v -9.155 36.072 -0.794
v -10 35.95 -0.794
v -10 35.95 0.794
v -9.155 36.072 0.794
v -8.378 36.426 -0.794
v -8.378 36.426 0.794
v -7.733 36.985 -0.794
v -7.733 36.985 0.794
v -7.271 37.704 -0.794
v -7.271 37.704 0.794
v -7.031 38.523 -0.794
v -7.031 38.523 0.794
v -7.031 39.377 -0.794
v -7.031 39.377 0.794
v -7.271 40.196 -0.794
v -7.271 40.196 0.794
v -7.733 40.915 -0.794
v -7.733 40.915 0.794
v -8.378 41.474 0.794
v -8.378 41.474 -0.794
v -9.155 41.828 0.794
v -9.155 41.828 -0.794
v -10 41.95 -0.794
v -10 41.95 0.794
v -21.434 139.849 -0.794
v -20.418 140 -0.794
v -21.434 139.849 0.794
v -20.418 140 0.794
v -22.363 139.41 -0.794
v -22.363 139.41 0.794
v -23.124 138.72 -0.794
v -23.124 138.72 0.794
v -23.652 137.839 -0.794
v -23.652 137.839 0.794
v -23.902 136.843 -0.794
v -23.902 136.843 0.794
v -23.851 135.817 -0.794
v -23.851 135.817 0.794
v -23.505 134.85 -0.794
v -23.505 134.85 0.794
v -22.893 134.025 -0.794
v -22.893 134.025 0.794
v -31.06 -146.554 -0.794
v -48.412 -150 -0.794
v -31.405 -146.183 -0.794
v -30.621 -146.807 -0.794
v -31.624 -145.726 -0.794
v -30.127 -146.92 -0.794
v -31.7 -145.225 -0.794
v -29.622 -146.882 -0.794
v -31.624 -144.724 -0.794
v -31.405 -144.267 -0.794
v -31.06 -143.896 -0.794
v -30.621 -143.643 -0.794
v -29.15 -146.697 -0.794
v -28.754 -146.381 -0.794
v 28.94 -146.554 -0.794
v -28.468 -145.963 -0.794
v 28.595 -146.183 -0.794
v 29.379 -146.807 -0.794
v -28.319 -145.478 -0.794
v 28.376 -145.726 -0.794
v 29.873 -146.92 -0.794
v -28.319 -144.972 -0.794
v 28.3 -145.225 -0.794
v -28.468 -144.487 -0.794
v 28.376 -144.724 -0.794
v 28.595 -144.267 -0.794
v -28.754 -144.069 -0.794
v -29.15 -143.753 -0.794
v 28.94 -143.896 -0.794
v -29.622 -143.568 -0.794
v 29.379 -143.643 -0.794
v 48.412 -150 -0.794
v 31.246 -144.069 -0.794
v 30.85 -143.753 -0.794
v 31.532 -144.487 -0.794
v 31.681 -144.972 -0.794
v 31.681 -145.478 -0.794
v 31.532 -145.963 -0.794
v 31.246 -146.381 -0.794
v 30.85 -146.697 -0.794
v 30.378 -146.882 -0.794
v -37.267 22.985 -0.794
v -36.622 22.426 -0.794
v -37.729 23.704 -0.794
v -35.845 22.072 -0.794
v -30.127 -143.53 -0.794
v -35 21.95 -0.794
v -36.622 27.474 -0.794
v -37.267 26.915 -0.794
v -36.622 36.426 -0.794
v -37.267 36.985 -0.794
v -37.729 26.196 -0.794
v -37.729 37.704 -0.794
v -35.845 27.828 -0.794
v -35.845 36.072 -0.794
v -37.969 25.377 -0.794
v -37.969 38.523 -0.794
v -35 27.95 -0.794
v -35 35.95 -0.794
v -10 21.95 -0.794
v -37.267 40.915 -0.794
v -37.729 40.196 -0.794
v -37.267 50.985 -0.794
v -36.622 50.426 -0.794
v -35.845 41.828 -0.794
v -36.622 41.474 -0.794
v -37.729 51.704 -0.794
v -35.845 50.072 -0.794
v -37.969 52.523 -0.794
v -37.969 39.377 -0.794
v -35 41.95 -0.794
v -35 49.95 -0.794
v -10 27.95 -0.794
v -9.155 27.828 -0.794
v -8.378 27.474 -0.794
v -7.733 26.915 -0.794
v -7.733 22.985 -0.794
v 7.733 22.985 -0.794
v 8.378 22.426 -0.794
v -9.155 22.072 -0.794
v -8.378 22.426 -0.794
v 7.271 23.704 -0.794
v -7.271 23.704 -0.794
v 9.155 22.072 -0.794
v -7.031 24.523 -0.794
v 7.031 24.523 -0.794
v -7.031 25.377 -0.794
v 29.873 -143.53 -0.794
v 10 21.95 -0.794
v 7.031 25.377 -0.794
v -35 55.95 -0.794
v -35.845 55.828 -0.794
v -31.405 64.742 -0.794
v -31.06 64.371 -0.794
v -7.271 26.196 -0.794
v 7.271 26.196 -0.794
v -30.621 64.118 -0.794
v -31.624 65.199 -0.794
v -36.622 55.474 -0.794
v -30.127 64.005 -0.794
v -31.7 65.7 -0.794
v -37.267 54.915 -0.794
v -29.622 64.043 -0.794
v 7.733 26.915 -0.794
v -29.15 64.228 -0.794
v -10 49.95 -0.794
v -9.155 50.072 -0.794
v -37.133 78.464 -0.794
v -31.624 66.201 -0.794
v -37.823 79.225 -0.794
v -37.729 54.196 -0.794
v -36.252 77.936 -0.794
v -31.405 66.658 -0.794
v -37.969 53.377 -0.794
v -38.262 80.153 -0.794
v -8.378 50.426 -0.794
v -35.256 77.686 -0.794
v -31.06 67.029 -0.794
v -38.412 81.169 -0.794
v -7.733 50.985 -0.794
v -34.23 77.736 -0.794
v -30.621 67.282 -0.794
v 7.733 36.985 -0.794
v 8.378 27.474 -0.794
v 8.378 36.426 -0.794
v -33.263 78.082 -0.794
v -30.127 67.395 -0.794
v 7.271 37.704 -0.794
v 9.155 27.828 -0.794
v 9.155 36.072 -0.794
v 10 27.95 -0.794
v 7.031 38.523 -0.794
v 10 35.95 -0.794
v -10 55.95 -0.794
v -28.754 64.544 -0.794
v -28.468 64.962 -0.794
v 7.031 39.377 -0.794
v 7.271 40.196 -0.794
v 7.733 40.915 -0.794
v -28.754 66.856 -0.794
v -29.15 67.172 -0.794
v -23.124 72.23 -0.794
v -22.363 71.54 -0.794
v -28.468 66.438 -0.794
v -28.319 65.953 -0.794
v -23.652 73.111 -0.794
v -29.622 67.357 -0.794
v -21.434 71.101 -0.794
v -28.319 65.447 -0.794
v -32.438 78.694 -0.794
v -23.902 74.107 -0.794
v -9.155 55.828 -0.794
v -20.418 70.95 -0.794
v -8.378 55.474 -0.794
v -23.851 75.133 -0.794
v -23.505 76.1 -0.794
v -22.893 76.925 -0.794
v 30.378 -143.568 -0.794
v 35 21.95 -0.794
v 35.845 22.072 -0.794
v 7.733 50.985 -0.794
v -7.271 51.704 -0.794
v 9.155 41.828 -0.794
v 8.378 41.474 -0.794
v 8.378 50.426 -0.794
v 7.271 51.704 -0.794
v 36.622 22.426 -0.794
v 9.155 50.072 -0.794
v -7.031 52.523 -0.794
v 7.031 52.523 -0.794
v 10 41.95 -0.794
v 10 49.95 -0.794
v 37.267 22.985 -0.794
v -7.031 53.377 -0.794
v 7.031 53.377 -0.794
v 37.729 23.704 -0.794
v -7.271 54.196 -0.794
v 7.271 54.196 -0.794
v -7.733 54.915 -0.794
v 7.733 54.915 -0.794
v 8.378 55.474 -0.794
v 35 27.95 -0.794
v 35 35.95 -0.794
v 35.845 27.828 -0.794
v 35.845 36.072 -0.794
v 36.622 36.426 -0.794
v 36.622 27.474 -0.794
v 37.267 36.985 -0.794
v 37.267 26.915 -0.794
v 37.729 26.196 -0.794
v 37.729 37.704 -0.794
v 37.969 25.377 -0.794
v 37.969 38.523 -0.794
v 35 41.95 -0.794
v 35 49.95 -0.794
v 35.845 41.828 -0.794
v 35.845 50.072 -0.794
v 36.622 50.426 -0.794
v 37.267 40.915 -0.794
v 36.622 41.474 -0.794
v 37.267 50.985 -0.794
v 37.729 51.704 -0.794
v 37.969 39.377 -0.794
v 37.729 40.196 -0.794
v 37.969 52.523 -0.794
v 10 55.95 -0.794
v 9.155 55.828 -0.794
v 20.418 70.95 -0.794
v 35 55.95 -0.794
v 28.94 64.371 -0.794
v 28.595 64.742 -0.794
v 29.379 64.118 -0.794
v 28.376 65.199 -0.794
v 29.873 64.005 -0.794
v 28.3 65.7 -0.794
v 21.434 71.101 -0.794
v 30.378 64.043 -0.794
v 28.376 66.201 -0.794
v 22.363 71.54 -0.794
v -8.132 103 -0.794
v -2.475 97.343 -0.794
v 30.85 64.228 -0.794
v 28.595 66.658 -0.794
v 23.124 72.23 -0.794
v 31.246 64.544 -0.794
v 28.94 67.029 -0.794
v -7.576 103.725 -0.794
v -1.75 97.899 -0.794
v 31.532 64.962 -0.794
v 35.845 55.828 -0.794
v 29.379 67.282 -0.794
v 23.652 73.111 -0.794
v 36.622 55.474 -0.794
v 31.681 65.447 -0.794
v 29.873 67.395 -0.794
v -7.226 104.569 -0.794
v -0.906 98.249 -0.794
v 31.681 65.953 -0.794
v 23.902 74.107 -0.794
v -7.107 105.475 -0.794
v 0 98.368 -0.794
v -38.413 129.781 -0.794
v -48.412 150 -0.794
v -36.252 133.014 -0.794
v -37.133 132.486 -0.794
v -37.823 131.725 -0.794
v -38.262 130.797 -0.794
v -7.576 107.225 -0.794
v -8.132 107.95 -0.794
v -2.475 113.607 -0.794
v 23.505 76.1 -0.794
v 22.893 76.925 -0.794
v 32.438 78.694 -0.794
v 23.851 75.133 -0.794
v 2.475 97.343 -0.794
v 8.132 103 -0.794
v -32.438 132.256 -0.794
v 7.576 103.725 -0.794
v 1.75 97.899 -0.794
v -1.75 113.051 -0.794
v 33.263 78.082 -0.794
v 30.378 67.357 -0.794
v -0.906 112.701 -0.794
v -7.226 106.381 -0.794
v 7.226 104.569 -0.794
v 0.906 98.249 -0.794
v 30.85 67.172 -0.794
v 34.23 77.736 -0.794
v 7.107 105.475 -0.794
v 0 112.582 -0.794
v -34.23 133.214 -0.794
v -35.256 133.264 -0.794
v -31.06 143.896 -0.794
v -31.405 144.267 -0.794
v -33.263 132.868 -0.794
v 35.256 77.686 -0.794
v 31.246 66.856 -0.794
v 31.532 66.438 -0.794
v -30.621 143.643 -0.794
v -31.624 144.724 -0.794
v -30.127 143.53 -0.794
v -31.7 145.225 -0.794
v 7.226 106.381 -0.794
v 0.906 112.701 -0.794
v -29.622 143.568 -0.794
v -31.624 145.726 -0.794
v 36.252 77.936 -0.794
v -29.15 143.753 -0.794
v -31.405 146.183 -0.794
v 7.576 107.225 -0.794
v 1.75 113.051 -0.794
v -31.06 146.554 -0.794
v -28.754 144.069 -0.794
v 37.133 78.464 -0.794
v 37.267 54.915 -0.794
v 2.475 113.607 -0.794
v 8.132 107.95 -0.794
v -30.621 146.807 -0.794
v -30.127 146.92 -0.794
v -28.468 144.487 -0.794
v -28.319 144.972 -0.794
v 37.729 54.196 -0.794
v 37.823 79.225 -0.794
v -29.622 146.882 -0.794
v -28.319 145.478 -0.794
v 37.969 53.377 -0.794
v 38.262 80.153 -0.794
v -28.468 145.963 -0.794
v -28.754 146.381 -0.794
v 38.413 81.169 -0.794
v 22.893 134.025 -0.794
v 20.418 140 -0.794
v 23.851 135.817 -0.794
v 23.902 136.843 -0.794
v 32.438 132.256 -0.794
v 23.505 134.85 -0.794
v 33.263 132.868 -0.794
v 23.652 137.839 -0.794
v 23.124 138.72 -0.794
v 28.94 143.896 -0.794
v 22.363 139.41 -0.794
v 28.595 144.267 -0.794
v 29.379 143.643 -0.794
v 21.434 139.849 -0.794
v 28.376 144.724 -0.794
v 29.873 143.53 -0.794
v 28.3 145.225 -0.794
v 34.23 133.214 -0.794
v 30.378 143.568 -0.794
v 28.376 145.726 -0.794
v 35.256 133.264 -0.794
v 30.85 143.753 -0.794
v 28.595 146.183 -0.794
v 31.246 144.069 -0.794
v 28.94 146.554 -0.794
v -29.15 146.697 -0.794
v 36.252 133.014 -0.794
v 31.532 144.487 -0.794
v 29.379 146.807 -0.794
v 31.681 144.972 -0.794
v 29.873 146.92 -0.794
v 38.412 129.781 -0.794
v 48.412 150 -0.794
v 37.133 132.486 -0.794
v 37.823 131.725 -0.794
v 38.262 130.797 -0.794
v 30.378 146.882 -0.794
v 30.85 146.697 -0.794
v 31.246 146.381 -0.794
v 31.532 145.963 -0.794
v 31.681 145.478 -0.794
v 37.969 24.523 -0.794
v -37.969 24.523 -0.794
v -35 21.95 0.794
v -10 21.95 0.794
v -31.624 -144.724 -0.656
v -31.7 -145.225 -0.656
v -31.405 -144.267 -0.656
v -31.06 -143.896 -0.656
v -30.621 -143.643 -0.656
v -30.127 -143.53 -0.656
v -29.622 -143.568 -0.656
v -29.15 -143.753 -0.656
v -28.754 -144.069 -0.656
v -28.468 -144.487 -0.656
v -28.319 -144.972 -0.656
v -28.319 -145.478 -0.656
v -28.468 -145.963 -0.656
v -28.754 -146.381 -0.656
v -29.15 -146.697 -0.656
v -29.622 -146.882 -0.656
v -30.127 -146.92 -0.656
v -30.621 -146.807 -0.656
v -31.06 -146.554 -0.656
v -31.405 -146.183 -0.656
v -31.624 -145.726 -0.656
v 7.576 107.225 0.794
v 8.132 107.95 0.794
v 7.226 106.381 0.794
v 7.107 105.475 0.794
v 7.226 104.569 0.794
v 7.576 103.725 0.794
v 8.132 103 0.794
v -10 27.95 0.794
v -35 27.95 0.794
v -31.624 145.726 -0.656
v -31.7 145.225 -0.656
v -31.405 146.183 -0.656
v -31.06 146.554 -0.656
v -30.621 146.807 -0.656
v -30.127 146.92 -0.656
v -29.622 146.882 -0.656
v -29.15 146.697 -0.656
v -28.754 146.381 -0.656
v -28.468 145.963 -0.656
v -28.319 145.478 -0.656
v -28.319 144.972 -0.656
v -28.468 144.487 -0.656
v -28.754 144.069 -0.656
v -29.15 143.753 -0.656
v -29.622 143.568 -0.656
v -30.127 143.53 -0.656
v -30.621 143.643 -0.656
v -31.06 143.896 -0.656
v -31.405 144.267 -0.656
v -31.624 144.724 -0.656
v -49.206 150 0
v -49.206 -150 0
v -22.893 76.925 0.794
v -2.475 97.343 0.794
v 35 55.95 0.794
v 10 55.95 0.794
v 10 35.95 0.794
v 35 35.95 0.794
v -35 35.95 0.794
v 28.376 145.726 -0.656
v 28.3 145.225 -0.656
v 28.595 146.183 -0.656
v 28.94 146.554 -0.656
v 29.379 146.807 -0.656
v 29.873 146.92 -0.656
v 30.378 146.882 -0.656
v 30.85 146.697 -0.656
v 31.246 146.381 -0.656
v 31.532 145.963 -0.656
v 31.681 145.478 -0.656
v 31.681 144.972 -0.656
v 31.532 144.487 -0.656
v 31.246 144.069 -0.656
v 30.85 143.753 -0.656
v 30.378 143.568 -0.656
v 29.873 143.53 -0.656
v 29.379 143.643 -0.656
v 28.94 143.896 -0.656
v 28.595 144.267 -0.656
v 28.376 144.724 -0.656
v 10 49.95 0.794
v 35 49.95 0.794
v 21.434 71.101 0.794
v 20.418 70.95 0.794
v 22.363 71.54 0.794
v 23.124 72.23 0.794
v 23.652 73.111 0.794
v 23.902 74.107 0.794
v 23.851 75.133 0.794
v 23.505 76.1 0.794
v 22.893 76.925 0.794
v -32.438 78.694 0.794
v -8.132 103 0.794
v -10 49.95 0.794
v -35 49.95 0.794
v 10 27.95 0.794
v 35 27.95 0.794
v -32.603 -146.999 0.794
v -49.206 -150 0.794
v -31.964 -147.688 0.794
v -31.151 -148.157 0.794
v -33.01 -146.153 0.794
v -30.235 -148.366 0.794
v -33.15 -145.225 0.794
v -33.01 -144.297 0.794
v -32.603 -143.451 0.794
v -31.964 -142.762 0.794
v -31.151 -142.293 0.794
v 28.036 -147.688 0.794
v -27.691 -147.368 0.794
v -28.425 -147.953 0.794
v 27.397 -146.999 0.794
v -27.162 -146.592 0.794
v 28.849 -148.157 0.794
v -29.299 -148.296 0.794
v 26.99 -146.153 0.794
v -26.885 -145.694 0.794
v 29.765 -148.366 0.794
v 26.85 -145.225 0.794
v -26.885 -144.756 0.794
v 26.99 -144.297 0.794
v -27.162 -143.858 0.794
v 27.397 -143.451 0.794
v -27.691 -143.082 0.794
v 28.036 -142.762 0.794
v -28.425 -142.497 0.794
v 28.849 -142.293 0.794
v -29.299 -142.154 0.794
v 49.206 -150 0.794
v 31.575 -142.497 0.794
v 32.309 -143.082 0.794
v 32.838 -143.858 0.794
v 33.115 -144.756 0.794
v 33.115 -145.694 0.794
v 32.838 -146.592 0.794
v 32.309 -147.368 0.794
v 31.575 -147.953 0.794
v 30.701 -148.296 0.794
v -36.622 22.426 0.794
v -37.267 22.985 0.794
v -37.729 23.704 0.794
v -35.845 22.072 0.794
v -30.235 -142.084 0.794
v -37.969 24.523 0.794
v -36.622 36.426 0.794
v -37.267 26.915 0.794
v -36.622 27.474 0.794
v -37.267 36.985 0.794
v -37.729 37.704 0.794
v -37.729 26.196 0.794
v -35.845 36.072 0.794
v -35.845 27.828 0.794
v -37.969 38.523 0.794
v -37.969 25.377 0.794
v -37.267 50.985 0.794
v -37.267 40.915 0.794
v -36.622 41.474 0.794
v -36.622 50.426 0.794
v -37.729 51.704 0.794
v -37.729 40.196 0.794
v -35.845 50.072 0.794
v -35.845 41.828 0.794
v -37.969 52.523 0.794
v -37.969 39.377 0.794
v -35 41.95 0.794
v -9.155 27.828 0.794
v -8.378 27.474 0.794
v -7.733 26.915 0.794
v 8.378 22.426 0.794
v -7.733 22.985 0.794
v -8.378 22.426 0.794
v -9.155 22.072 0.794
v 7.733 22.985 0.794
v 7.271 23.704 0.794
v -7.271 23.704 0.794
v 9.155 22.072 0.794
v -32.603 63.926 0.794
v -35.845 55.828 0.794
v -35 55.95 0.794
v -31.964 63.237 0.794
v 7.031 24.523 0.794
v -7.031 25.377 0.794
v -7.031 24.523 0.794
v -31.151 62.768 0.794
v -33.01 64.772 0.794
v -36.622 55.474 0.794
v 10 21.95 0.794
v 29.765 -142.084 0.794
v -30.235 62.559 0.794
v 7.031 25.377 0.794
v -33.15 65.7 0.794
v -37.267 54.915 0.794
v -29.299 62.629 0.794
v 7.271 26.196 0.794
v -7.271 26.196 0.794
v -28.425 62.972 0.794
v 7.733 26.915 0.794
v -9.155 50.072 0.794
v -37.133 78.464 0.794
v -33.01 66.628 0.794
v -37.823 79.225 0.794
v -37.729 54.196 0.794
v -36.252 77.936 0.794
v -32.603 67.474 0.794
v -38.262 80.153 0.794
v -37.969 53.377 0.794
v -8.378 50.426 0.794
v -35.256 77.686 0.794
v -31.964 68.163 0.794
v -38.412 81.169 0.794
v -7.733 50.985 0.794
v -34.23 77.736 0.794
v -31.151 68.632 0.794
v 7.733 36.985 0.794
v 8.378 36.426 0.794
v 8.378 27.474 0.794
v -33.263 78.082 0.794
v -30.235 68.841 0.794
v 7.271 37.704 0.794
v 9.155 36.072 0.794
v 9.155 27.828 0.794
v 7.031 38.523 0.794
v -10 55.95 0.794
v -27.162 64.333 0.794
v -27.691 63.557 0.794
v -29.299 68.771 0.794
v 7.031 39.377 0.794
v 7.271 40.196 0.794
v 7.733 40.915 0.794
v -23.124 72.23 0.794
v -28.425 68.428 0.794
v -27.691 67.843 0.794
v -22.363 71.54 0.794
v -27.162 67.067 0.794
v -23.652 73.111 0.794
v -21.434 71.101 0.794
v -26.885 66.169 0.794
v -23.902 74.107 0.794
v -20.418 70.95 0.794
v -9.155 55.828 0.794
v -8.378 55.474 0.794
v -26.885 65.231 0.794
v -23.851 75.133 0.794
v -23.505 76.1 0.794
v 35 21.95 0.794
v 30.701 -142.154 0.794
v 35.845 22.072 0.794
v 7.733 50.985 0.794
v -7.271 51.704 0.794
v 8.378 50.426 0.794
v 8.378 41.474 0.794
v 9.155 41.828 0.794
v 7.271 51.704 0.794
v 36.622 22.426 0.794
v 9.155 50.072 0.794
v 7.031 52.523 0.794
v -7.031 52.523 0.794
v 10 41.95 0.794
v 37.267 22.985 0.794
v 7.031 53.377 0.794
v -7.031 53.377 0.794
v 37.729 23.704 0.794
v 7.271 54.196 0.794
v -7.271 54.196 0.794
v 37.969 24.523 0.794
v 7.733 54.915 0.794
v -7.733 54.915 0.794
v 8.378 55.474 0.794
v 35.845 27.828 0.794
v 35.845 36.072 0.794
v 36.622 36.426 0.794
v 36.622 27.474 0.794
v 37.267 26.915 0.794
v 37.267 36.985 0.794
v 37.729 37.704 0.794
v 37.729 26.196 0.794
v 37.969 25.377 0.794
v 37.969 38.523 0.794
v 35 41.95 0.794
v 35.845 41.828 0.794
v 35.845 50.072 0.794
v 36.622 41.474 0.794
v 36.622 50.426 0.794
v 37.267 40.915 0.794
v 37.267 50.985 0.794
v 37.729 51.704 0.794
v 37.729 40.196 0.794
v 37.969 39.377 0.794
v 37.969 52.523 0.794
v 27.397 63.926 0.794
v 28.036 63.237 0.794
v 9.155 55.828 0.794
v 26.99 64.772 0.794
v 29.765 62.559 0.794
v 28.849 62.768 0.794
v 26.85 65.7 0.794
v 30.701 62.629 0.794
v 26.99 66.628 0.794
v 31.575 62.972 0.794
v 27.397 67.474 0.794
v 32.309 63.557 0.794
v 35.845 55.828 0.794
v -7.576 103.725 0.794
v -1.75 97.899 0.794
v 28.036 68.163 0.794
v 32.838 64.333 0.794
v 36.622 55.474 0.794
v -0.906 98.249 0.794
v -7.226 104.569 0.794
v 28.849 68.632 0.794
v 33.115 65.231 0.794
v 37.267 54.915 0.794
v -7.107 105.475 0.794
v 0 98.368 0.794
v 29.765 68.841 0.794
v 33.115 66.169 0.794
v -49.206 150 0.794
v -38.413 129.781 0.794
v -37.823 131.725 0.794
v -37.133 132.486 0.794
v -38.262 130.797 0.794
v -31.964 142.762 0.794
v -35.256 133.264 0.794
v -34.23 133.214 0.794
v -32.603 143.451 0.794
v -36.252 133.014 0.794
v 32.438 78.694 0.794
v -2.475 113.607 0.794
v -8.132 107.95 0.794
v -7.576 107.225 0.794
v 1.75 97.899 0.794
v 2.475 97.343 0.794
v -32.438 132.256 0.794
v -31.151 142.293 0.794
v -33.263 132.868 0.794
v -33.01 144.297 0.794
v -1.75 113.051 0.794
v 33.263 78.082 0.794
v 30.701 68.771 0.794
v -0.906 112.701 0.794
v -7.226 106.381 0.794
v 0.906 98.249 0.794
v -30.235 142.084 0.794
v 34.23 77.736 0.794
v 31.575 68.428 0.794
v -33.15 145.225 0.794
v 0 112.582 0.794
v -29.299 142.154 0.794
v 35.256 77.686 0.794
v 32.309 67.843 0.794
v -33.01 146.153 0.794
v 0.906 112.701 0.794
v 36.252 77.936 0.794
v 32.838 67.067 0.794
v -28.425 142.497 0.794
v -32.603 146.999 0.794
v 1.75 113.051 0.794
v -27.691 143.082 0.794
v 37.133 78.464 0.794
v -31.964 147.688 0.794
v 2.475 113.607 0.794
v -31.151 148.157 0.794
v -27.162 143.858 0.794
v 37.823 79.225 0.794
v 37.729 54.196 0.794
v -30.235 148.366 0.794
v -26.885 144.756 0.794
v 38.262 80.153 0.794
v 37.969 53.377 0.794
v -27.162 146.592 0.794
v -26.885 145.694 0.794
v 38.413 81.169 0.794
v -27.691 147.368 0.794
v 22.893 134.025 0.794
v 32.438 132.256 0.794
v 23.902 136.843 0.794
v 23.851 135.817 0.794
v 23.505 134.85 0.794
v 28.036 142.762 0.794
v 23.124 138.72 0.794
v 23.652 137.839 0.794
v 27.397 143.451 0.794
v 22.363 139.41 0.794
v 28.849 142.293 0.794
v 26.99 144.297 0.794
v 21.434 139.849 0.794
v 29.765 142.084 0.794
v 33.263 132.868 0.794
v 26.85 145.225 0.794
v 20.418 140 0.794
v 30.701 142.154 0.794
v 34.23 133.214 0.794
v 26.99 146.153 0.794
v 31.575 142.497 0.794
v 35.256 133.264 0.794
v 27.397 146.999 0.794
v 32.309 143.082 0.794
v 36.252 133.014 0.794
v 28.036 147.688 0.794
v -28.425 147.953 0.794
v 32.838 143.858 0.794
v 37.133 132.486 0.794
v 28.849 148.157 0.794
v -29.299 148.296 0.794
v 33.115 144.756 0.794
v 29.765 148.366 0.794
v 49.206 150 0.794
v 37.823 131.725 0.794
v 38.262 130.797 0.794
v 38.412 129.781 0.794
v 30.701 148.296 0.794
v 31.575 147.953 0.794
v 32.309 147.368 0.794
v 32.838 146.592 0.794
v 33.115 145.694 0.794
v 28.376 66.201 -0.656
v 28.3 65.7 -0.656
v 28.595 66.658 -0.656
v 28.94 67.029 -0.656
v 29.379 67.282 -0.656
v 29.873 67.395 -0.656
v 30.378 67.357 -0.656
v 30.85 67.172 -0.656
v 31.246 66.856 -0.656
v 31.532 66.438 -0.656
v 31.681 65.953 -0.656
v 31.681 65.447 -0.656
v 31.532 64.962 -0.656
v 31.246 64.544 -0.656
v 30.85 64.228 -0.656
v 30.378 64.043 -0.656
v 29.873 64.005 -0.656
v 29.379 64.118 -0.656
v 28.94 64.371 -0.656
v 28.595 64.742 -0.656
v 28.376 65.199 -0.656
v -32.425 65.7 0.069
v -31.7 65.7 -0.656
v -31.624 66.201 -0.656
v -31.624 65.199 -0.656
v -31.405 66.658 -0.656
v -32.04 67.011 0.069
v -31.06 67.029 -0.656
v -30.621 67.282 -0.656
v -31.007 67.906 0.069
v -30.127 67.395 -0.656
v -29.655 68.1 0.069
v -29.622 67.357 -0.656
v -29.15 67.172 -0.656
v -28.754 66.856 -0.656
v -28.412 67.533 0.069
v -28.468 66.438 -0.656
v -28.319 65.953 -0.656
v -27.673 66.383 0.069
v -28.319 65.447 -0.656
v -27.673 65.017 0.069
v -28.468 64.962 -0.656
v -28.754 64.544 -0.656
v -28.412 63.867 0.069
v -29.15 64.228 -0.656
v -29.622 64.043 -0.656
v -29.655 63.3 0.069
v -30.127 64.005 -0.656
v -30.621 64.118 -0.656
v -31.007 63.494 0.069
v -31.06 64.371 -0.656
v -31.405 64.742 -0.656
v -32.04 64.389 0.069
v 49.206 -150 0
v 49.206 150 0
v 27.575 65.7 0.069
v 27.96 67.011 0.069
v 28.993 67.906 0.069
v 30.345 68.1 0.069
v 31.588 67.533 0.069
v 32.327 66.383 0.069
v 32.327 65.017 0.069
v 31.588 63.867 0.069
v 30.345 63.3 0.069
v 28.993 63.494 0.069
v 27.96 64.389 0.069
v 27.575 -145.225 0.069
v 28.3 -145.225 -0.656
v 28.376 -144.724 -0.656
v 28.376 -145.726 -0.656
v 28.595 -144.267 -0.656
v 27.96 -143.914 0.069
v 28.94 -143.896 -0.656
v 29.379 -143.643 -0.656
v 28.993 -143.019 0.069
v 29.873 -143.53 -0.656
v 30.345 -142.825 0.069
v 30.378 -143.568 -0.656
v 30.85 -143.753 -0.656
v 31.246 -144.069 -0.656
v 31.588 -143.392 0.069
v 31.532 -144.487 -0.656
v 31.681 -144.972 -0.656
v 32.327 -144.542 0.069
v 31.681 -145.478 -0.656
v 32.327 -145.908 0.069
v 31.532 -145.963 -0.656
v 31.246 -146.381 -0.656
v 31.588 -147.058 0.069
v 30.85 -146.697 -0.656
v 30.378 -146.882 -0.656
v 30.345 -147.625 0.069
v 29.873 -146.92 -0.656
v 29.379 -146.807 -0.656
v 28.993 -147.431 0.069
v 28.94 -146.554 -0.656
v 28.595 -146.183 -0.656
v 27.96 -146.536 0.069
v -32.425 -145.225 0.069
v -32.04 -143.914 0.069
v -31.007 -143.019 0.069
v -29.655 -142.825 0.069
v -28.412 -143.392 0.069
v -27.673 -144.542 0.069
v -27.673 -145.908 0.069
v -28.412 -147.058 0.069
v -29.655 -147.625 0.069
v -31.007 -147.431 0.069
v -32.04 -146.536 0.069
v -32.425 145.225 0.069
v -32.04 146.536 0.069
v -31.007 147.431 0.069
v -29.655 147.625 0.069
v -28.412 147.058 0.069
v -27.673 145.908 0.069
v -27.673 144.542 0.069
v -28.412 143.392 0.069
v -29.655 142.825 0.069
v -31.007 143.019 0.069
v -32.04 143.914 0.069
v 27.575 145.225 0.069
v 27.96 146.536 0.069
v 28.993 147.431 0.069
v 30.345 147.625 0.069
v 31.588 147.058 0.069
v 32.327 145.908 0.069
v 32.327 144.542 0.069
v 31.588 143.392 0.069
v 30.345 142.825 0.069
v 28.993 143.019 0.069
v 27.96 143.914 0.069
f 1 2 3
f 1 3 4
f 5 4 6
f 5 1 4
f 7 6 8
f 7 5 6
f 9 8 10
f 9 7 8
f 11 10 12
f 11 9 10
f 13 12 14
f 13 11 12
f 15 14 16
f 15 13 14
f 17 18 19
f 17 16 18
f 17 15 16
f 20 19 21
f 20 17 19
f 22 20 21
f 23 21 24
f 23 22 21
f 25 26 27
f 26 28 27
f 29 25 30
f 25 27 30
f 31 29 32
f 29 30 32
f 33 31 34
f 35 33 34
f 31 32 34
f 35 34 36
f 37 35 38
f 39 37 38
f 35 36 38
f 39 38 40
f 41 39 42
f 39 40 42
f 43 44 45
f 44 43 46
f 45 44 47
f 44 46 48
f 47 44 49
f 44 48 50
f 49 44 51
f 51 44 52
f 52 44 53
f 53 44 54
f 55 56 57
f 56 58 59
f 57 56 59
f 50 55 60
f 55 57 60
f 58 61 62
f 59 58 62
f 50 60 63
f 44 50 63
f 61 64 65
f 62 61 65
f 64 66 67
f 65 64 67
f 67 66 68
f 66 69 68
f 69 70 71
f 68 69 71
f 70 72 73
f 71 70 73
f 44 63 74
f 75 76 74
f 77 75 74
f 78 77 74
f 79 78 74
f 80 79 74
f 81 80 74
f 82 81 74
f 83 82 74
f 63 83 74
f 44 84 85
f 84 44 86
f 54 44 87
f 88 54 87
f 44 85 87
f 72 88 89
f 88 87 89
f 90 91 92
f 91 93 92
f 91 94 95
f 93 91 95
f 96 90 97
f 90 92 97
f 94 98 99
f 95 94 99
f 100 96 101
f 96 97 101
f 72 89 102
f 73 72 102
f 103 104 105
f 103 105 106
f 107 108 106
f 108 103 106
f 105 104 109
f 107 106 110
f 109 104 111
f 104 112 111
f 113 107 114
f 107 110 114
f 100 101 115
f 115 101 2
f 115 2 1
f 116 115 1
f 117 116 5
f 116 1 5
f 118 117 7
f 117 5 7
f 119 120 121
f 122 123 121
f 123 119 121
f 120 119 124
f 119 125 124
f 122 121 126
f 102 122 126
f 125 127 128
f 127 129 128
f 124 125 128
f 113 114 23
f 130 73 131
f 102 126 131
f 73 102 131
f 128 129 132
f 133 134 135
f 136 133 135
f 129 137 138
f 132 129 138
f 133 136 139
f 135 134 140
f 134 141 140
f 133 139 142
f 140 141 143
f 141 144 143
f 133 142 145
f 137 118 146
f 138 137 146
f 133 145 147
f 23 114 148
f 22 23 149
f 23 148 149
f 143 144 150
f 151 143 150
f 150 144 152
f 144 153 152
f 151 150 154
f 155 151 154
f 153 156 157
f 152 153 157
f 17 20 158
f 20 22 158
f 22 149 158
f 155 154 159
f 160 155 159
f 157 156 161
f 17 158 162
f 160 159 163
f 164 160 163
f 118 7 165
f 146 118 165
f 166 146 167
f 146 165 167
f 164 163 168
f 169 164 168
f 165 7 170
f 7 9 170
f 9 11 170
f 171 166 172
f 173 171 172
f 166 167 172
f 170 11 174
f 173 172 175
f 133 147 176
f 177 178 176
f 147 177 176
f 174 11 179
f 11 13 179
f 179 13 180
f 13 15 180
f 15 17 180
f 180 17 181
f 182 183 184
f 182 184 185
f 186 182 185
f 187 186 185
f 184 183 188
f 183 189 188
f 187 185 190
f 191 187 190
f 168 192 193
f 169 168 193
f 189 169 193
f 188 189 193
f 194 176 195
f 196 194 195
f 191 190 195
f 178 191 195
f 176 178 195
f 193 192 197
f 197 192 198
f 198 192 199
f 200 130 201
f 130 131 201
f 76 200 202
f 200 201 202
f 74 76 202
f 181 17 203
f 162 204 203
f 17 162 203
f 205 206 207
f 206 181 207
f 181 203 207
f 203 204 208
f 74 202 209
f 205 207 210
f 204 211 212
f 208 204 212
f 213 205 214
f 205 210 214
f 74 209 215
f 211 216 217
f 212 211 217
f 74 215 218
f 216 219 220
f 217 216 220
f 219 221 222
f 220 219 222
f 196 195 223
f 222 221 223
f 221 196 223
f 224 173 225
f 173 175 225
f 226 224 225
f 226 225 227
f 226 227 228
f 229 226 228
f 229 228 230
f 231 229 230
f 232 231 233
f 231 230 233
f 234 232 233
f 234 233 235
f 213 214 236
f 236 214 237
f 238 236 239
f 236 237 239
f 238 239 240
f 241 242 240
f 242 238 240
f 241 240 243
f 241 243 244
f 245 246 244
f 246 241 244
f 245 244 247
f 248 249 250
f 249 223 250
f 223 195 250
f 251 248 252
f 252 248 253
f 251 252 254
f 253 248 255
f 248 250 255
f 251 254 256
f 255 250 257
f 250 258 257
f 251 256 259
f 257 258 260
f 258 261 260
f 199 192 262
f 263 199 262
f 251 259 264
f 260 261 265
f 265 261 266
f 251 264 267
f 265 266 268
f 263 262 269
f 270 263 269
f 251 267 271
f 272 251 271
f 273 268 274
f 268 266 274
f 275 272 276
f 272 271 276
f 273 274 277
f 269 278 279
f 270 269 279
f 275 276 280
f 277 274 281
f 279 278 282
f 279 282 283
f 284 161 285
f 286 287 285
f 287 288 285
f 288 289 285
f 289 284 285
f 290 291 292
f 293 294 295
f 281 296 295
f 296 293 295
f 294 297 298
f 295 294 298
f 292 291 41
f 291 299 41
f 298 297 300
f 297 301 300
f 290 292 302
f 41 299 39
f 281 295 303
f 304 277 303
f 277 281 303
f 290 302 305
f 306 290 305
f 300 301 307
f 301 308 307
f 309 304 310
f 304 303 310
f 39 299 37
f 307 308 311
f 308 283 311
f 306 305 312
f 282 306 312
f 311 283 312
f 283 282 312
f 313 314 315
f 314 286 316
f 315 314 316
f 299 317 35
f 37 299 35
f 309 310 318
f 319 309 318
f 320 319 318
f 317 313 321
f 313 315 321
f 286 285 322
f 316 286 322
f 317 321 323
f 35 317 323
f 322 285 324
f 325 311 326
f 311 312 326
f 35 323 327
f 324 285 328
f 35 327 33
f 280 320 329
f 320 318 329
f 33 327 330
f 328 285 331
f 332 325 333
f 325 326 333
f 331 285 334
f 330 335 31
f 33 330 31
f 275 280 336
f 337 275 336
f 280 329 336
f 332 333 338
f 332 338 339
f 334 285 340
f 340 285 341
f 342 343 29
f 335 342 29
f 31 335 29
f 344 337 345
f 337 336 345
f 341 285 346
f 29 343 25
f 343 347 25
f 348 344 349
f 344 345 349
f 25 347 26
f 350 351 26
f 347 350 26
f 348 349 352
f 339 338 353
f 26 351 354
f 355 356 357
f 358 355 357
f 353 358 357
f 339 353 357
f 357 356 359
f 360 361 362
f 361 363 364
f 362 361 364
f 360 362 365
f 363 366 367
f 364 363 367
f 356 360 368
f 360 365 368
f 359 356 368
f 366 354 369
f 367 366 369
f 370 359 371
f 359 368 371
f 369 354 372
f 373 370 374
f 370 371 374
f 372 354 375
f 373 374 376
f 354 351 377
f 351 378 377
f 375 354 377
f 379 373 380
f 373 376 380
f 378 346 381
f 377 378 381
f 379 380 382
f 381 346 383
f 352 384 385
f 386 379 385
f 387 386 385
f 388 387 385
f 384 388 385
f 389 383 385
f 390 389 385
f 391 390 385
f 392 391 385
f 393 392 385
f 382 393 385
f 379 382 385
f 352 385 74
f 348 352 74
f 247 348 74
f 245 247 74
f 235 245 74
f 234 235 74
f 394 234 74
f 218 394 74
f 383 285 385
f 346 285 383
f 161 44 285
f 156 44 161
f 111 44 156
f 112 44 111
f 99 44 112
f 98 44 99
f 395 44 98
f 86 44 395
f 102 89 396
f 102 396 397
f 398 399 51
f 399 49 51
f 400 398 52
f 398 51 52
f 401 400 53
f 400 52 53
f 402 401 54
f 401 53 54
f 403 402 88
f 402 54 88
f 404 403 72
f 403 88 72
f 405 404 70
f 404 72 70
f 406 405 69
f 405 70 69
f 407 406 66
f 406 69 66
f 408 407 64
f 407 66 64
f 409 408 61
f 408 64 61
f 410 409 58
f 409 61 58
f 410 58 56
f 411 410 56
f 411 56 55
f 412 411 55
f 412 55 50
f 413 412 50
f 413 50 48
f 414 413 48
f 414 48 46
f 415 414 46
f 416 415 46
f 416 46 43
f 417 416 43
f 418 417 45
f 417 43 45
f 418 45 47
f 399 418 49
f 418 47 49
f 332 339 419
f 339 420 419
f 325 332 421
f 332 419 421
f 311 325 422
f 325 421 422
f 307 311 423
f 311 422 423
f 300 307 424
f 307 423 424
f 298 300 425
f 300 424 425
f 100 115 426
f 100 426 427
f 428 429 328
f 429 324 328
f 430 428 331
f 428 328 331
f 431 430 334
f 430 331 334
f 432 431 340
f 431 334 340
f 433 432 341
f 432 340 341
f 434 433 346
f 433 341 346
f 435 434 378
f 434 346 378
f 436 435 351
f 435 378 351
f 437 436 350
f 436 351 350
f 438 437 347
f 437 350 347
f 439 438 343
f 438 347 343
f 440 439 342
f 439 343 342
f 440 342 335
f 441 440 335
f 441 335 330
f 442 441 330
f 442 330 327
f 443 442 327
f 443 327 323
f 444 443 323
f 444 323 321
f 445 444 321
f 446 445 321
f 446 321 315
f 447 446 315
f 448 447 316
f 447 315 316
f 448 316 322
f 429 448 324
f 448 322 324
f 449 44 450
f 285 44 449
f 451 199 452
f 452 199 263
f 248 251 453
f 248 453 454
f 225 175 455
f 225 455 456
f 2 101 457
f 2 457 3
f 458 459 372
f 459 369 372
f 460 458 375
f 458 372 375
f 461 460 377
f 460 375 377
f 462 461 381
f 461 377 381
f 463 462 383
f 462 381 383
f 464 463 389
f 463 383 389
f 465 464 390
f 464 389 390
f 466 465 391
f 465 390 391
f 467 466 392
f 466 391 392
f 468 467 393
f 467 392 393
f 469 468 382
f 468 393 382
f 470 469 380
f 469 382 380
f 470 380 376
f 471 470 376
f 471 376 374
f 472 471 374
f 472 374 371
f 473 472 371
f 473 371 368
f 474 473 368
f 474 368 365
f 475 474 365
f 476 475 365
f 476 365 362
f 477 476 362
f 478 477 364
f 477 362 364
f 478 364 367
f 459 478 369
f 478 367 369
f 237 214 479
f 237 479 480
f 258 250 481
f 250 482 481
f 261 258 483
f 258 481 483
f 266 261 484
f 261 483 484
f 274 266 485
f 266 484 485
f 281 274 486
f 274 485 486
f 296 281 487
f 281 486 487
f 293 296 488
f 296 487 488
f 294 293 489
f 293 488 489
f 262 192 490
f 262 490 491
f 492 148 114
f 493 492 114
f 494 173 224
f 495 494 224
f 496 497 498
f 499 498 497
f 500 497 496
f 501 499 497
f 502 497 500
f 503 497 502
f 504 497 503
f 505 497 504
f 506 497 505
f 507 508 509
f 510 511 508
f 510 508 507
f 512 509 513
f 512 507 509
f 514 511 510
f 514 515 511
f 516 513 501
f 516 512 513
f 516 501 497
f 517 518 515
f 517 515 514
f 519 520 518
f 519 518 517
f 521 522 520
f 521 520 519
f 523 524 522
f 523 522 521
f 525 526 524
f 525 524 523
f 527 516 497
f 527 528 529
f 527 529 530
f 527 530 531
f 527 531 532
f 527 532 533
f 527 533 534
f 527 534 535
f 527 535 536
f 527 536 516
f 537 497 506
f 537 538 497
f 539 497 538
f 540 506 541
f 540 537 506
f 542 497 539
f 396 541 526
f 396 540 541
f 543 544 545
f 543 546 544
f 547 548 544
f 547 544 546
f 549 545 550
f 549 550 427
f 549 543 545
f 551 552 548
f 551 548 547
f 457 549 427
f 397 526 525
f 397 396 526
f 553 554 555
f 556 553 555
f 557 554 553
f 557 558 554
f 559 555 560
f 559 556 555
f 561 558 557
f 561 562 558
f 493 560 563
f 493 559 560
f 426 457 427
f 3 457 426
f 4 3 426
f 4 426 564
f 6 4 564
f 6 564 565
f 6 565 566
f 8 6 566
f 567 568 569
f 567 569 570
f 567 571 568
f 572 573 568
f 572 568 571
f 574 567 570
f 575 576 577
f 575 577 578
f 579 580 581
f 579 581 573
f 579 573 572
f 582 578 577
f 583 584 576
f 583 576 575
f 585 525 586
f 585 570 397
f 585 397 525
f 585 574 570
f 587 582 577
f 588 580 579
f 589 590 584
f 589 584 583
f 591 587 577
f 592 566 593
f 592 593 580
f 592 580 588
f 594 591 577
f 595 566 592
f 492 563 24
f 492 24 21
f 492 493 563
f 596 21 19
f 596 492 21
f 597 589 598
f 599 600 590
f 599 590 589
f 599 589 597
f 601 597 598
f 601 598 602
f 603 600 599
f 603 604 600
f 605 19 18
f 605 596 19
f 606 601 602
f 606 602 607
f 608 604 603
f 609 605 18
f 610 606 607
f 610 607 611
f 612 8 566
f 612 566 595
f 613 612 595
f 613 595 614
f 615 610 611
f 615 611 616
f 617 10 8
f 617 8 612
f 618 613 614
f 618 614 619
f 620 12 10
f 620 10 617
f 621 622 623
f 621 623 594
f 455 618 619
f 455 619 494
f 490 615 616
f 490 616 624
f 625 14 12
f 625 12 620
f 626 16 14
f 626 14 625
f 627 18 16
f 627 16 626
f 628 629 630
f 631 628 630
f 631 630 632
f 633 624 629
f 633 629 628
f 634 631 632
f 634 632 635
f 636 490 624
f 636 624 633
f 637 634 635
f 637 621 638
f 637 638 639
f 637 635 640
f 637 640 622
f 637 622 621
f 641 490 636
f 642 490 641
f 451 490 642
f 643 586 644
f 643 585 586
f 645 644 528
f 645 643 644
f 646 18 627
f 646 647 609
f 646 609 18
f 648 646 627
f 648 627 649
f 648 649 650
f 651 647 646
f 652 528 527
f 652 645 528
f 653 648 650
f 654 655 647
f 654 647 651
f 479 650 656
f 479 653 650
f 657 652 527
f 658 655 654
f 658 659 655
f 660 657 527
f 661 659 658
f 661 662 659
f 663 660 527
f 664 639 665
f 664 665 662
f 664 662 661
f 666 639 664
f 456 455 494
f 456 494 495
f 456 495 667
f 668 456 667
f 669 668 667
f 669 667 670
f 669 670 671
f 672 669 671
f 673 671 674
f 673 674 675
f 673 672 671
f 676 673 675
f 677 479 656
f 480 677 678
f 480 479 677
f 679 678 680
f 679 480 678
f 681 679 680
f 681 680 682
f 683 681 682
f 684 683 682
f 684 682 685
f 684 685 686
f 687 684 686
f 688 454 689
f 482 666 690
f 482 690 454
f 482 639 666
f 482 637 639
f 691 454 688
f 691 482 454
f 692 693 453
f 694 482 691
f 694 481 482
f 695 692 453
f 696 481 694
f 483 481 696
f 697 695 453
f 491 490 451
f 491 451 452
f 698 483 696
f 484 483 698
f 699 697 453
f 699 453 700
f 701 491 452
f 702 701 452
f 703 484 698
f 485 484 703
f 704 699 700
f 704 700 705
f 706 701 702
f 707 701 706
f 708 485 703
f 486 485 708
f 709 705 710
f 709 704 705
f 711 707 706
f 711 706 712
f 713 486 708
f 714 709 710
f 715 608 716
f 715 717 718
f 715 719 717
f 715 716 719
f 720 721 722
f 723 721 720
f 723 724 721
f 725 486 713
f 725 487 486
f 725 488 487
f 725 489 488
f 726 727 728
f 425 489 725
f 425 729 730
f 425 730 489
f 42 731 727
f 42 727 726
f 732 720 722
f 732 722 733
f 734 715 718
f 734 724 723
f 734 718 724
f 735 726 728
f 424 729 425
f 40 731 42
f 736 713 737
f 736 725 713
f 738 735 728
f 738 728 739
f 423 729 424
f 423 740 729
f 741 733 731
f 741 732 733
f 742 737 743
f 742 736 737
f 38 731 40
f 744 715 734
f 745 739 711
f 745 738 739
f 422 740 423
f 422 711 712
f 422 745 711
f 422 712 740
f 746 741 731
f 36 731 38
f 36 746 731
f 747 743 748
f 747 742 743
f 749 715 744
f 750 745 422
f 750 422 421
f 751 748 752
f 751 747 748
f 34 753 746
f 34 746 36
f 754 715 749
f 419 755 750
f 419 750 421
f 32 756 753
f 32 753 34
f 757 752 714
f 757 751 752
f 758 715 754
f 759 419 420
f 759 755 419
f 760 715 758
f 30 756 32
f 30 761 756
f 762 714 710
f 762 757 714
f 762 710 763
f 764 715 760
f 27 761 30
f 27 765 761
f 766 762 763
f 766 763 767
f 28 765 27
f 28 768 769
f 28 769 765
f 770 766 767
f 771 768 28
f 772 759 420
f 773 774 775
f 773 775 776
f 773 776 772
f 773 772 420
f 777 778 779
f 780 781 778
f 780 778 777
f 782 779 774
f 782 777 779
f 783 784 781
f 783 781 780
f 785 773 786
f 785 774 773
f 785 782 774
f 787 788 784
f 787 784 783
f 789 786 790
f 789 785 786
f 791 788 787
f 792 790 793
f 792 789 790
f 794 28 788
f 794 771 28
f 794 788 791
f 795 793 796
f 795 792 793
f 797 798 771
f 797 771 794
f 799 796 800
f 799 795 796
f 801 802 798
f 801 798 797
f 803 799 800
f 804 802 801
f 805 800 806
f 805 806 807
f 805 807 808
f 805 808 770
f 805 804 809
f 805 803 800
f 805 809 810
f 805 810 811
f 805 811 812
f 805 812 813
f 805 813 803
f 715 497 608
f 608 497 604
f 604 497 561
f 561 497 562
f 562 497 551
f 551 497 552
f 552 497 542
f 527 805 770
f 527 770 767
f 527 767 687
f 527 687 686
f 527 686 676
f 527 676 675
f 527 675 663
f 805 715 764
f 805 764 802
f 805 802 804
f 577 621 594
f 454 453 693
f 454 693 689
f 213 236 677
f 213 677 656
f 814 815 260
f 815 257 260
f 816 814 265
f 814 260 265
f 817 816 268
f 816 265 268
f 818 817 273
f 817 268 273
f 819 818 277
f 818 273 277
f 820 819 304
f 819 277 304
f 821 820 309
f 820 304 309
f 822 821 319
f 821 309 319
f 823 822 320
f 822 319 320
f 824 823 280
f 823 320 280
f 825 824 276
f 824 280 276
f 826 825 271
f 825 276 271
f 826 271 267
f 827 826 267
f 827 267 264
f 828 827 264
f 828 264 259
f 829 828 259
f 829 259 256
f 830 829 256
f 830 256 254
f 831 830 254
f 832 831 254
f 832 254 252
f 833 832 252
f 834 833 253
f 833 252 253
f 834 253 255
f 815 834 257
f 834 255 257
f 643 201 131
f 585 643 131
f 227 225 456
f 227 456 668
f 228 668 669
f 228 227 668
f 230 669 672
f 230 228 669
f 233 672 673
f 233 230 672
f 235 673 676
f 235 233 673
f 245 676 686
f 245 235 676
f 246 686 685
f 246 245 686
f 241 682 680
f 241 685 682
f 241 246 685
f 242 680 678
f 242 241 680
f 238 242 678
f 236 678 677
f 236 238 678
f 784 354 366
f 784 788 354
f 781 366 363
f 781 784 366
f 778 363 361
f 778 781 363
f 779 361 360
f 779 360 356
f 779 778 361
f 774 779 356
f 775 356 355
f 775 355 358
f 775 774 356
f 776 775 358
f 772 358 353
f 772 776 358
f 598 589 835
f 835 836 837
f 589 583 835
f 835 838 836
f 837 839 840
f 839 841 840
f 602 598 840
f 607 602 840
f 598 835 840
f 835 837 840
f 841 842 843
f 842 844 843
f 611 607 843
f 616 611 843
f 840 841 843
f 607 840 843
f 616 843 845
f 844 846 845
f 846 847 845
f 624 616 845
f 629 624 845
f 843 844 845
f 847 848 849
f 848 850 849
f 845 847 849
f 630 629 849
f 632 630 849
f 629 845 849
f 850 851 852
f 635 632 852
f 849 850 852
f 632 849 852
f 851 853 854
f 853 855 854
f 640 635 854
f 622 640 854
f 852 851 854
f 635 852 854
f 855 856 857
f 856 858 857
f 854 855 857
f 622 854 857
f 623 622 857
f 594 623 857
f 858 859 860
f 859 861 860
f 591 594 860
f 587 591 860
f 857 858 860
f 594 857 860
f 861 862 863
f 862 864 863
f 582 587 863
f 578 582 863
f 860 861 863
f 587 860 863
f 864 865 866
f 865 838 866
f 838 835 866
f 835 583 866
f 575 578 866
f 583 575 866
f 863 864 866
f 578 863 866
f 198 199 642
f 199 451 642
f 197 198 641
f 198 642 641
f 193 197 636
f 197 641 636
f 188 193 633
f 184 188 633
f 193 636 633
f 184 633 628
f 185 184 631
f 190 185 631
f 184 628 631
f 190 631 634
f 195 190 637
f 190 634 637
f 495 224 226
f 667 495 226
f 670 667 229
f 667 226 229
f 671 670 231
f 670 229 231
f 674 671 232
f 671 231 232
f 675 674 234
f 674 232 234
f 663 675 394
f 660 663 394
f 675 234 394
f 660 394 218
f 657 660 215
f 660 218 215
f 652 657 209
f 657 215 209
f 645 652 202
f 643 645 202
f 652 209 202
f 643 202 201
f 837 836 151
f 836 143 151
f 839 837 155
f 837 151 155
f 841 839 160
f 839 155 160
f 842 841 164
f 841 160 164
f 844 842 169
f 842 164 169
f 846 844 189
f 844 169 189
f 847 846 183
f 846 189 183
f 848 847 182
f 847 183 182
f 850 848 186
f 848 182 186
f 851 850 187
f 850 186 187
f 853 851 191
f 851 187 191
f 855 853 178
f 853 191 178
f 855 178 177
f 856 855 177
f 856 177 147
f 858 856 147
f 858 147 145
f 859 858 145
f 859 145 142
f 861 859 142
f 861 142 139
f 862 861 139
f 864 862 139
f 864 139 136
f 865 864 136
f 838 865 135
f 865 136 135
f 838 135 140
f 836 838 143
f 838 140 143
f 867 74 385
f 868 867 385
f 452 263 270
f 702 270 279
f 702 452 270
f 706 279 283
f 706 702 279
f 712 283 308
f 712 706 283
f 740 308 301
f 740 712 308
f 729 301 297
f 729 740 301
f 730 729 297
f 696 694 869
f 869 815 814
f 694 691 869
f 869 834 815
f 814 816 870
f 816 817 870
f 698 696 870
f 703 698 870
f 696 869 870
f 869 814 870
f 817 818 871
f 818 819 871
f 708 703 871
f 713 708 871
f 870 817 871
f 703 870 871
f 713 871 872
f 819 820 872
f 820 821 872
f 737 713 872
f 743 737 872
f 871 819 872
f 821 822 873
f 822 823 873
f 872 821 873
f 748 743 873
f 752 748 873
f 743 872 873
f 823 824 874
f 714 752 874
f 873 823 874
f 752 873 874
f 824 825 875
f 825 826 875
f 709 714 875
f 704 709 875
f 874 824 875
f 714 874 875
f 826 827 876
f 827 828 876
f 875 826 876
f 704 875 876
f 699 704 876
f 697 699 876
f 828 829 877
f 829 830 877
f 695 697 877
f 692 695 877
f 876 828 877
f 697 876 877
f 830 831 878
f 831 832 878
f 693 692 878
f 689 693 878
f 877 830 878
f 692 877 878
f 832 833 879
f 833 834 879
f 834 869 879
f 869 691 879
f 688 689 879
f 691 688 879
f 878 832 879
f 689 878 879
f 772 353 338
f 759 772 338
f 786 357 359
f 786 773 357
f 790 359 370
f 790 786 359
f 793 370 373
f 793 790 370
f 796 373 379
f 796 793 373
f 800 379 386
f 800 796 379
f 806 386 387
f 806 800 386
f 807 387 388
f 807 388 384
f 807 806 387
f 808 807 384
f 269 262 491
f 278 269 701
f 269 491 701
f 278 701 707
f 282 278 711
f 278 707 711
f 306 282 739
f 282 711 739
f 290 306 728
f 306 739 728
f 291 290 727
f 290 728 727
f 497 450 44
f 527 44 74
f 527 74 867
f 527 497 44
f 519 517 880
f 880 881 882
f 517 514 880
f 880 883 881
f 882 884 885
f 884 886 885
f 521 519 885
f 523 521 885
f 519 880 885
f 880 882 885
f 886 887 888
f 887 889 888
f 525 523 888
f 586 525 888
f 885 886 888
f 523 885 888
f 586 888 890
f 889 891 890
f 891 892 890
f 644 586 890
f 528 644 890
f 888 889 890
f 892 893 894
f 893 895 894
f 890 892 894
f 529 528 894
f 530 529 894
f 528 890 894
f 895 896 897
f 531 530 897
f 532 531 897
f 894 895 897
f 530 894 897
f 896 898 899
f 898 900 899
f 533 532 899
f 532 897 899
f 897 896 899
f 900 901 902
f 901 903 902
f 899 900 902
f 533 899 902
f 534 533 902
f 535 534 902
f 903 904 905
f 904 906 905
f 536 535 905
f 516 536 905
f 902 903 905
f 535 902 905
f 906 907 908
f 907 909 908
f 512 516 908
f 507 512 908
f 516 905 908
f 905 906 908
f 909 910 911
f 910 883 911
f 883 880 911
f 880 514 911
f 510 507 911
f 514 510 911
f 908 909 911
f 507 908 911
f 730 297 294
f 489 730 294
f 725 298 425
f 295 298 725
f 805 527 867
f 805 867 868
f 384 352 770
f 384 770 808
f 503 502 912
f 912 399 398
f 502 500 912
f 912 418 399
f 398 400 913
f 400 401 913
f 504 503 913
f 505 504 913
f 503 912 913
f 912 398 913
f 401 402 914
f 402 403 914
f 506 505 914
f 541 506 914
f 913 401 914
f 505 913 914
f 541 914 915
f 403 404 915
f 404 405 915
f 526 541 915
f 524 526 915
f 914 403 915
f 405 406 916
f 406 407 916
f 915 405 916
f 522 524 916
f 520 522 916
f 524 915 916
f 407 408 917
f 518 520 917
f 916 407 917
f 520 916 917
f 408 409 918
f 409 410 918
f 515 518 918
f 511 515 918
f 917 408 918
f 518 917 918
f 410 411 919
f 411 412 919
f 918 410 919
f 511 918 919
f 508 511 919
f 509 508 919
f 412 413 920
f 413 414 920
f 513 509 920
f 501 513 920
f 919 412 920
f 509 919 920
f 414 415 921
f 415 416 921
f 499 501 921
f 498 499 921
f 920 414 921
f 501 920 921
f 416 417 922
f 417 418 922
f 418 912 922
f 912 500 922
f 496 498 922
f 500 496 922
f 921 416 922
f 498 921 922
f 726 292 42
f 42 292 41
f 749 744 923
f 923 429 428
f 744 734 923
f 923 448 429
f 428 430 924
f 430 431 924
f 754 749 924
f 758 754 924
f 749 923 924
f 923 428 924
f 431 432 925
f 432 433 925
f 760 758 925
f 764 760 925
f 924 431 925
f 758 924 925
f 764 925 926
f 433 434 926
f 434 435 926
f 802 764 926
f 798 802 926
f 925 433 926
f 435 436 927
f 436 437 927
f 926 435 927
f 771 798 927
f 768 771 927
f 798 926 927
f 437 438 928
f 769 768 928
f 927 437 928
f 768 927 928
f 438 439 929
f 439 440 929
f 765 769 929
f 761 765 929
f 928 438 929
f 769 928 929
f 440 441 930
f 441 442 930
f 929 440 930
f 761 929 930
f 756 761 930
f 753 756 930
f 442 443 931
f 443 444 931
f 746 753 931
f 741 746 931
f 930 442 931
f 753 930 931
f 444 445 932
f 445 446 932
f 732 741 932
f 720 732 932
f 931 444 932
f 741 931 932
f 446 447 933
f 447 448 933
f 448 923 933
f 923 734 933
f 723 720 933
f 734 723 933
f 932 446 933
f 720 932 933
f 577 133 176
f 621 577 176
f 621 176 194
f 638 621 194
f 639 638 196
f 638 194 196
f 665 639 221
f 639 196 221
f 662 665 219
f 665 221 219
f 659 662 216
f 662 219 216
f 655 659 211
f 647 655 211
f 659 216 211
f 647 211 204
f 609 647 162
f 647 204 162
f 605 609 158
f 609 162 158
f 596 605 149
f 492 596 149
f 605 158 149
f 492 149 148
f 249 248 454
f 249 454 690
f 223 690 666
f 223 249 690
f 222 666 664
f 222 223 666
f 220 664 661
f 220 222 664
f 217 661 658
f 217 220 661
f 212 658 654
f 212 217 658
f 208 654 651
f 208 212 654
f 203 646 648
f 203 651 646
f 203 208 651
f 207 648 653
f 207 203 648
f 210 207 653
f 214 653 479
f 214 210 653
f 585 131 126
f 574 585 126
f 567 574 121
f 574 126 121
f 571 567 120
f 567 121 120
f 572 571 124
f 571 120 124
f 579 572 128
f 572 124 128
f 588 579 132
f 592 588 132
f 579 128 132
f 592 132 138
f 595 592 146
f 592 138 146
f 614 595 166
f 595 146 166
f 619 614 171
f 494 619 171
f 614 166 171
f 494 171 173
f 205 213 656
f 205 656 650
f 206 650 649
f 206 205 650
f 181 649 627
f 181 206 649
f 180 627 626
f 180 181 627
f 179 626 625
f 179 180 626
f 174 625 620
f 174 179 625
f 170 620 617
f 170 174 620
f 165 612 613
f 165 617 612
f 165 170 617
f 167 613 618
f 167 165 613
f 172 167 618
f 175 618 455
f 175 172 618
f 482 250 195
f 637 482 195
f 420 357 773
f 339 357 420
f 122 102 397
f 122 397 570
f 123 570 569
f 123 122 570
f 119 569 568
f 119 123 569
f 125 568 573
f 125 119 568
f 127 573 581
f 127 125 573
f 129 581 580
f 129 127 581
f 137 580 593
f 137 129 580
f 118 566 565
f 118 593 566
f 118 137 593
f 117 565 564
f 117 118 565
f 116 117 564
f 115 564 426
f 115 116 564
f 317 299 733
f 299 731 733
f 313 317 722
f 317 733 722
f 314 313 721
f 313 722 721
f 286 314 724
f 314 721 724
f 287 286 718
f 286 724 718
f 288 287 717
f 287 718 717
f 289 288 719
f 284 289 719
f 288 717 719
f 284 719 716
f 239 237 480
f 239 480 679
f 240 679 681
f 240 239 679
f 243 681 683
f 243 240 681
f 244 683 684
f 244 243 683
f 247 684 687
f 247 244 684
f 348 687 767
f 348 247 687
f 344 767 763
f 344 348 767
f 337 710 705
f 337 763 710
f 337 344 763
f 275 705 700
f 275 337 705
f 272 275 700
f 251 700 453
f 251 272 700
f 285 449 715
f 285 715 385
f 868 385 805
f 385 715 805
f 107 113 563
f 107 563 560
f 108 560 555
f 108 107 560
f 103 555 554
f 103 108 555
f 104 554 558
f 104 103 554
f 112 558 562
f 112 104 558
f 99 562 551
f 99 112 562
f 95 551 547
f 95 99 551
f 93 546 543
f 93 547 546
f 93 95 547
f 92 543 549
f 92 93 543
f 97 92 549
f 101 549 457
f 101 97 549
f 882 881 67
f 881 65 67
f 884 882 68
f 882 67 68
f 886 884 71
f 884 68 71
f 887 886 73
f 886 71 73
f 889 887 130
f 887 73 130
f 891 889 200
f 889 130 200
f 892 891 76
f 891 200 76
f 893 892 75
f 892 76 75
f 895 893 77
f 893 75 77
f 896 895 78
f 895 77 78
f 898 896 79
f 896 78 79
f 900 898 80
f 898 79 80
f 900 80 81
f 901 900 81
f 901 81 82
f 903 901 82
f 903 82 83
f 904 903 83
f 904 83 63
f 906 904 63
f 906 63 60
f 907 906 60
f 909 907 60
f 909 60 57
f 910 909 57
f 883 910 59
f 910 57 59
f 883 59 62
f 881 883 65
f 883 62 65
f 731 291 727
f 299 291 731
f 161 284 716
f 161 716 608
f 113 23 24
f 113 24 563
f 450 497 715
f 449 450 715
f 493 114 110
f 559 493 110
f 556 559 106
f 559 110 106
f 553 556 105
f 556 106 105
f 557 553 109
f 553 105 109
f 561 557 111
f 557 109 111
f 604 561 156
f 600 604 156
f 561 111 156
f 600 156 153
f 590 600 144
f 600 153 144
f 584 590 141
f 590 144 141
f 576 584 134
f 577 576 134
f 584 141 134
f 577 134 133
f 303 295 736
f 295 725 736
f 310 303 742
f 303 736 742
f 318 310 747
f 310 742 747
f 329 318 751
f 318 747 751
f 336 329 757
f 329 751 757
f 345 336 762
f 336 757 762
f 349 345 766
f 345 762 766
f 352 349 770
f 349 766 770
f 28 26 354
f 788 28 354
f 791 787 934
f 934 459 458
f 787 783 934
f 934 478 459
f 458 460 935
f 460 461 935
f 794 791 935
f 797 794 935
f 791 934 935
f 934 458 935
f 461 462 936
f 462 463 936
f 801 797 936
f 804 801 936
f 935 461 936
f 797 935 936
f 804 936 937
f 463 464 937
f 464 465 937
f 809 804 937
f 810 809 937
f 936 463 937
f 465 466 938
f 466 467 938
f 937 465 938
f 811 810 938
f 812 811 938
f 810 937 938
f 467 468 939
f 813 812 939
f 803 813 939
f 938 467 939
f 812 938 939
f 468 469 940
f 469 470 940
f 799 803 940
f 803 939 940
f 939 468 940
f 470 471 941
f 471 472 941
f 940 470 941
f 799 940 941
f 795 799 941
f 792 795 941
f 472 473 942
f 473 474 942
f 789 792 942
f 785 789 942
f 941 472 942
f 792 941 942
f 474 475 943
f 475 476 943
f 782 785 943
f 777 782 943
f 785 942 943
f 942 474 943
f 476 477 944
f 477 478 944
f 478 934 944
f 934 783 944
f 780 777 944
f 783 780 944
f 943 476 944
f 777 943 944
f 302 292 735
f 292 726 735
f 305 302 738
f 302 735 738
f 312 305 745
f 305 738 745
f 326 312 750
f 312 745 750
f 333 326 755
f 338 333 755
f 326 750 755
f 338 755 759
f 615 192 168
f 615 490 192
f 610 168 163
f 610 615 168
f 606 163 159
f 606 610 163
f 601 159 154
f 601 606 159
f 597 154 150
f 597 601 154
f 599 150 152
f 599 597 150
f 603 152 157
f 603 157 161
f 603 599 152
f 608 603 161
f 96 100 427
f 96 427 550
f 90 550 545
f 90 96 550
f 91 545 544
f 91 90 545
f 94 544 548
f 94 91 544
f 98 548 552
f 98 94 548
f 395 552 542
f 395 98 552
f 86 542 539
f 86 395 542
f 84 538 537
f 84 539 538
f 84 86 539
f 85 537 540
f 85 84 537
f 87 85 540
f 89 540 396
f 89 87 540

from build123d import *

# Parameters (mm, degrees)
SKETCH1_W                                       = 98.4125
SKETCH1_H                                       = 300
BOSS_EXTRUDE1_DEPTH                             = 0.79375
CHAMFER1_SIZE                                   = 0.79375
CUT_EXTRUDE1_DEPTH                              = 2.5875
FILLET1_R                                       = 3.5
CSK_FOR_M3_FLAT_HEAD_MACHINE_SCREW1_D           = 3.4
CSK_FOR_M3_FLAT_HEAD_MACHINE_SCREW1_DEPTH       = 7.596
CSK_FOR_M3_FLAT_HEAD_MACHINE_SCREW1_CSINK_D     = 6.3
CSK_FOR_M3_FLAT_HEAD_MACHINE_SCREW1_CSINK_ANGLE = 90
CSK_FOR_M3_FLAT_HEAD_MACHINE_SCREW1_TIP         = 1.021463052


with BuildPart() as part:
    # Sketch1 → Boss-Extrude1 (new body, symmetric)
    with BuildSketch(Plane.XY):
        Rectangle(SKETCH1_W, SKETCH1_H)
    extrude(amount=BOSS_EXTRUDE1_DEPTH, both=True)

    # Chamfer1
    chamfer1_edges = [part.edges().sort_by_distance(p)[0] for p in [
        (49.20625, 0, -0.79375),
        (-49.20625, 0, -0.79375),
    ]]
    chamfer(chamfer1_edges, length=CHAMFER1_SIZE)

    # Sketch2 → Cut-Extrude1 (cut, through all)
    with BuildSketch(Plane(origin=(0, 0, -0.79375), x_dir=(-1, 0, 0), z_dir=(0, 0, -1))):
        Polygon((28.868145751, 70.95), (0, 99.818145751), (-28.868145751, 70.95), align=None)
        Polygon((-38.4125, 72.719354249), (-38.4125, 138.230645751), (-5.656854249, 105.475), align=None)
        Polygon((28.868145751, 140), (-28.868145751, 140), (0, 111.131854249), align=None)
        Polygon((38.4125, 138.230645751), (38.4125, 72.719354249), (5.656854249, 105.475), align=None)
        with BuildLine():
            Line((10, 49.95), (35, 49.95))
            ThreePointArc((35, 49.95), (38, 52.95), (35, 55.95))
            Line((35, 55.95), (10, 55.95))
            ThreePointArc((10, 55.95), (7, 52.95), (10, 49.95))
        make_face()
        with BuildLine():
            Line((-35, 21.95), (-10, 21.95))
            ThreePointArc((-10, 21.95), (-7, 24.95), (-10, 27.95))
            Line((-10, 27.95), (-35, 27.95))
            ThreePointArc((-35, 27.95), (-38, 24.95), (-35, 21.95))
        make_face()
        with BuildLine():
            Line((-35, 55.95), (-10, 55.95))
            ThreePointArc((-10, 55.95), (-7, 52.95), (-10, 49.95))
            Line((-10, 49.95), (-35, 49.95))
            ThreePointArc((-35, 49.95), (-38, 52.95), (-35, 55.95))
        make_face()
        with BuildLine():
            Line((-35, 41.95), (-10, 41.95))
            ThreePointArc((-10, 41.95), (-7, 38.95), (-10, 35.95))
            Line((-10, 35.95), (-35, 35.95))
            ThreePointArc((-35, 35.95), (-38, 38.95), (-35, 41.95))
        make_face()
        with BuildLine():
            Line((10, 41.95), (35, 41.95))
            ThreePointArc((35, 41.95), (38, 38.95), (35, 35.95))
            Line((35, 35.95), (10, 35.95))
            ThreePointArc((10, 35.95), (7, 38.95), (10, 41.95))
        make_face()
        with BuildLine():
            Line((10, 27.95), (35, 27.95))
            ThreePointArc((35, 27.95), (38, 24.95), (35, 21.95))
            Line((35, 21.95), (10, 21.95))
            ThreePointArc((10, 21.95), (7, 24.95), (10, 27.95))
        make_face()
    extrude(amount=-CUT_EXTRUDE1_DEPTH, mode=Mode.SUBTRACT)

    # Fillet1
    fillet1_edges = [part.edges().sort_by_distance(p)[0] for p in [
        (38.4125, 72.719354249, 0),
        (38.4125, 138.230645751, 0),
        (5.656854249, 105.475, 0),
        (-38.4125, 138.230645751, 0),
        (-38.4125, 72.719354249, 0),
        (-5.656854249, 105.475, 0),
        (0, 99.818145751, 0),
        (-28.868145751, 70.95, 0),
        (28.868145751, 70.95, 0),
        (28.868145751, 140, 0),
        (-28.868145751, 140, 0),
        (0, 111.131854249, 0),
    ]]
    fillet(fillet1_edges, radius=FILLET1_R)

    # CSK for M3 Flat Head Machine Screw1
    with Locations(Plane.XY.offset(0.79375)):
        with Locations((-30, -145.225), (30, -145.225), (-30, 65.7), (30, 65.7), (30, 145.225), (-30, 145.225)):
            CounterSinkHole(CSK_FOR_M3_FLAT_HEAD_MACHINE_SCREW1_D / 2, CSK_FOR_M3_FLAT_HEAD_MACHINE_SCREW1_CSINK_D / 2, depth=CSK_FOR_M3_FLAT_HEAD_MACHINE_SCREW1_DEPTH, counter_sink_angle=CSK_FOR_M3_FLAT_HEAD_MACHINE_SCREW1_CSINK_ANGLE)
            with Locations((0, 0, -(CSK_FOR_M3_FLAT_HEAD_MACHINE_SCREW1_DEPTH + CSK_FOR_M3_FLAT_HEAD_MACHINE_SCREW1_TIP / 2))):  # 118° drill point
                Cone(0, CSK_FOR_M3_FLAT_HEAD_MACHINE_SCREW1_D / 2, CSK_FOR_M3_FLAT_HEAD_MACHINE_SCREW1_TIP, mode=Mode.SUBTRACT)


solid = part.part
